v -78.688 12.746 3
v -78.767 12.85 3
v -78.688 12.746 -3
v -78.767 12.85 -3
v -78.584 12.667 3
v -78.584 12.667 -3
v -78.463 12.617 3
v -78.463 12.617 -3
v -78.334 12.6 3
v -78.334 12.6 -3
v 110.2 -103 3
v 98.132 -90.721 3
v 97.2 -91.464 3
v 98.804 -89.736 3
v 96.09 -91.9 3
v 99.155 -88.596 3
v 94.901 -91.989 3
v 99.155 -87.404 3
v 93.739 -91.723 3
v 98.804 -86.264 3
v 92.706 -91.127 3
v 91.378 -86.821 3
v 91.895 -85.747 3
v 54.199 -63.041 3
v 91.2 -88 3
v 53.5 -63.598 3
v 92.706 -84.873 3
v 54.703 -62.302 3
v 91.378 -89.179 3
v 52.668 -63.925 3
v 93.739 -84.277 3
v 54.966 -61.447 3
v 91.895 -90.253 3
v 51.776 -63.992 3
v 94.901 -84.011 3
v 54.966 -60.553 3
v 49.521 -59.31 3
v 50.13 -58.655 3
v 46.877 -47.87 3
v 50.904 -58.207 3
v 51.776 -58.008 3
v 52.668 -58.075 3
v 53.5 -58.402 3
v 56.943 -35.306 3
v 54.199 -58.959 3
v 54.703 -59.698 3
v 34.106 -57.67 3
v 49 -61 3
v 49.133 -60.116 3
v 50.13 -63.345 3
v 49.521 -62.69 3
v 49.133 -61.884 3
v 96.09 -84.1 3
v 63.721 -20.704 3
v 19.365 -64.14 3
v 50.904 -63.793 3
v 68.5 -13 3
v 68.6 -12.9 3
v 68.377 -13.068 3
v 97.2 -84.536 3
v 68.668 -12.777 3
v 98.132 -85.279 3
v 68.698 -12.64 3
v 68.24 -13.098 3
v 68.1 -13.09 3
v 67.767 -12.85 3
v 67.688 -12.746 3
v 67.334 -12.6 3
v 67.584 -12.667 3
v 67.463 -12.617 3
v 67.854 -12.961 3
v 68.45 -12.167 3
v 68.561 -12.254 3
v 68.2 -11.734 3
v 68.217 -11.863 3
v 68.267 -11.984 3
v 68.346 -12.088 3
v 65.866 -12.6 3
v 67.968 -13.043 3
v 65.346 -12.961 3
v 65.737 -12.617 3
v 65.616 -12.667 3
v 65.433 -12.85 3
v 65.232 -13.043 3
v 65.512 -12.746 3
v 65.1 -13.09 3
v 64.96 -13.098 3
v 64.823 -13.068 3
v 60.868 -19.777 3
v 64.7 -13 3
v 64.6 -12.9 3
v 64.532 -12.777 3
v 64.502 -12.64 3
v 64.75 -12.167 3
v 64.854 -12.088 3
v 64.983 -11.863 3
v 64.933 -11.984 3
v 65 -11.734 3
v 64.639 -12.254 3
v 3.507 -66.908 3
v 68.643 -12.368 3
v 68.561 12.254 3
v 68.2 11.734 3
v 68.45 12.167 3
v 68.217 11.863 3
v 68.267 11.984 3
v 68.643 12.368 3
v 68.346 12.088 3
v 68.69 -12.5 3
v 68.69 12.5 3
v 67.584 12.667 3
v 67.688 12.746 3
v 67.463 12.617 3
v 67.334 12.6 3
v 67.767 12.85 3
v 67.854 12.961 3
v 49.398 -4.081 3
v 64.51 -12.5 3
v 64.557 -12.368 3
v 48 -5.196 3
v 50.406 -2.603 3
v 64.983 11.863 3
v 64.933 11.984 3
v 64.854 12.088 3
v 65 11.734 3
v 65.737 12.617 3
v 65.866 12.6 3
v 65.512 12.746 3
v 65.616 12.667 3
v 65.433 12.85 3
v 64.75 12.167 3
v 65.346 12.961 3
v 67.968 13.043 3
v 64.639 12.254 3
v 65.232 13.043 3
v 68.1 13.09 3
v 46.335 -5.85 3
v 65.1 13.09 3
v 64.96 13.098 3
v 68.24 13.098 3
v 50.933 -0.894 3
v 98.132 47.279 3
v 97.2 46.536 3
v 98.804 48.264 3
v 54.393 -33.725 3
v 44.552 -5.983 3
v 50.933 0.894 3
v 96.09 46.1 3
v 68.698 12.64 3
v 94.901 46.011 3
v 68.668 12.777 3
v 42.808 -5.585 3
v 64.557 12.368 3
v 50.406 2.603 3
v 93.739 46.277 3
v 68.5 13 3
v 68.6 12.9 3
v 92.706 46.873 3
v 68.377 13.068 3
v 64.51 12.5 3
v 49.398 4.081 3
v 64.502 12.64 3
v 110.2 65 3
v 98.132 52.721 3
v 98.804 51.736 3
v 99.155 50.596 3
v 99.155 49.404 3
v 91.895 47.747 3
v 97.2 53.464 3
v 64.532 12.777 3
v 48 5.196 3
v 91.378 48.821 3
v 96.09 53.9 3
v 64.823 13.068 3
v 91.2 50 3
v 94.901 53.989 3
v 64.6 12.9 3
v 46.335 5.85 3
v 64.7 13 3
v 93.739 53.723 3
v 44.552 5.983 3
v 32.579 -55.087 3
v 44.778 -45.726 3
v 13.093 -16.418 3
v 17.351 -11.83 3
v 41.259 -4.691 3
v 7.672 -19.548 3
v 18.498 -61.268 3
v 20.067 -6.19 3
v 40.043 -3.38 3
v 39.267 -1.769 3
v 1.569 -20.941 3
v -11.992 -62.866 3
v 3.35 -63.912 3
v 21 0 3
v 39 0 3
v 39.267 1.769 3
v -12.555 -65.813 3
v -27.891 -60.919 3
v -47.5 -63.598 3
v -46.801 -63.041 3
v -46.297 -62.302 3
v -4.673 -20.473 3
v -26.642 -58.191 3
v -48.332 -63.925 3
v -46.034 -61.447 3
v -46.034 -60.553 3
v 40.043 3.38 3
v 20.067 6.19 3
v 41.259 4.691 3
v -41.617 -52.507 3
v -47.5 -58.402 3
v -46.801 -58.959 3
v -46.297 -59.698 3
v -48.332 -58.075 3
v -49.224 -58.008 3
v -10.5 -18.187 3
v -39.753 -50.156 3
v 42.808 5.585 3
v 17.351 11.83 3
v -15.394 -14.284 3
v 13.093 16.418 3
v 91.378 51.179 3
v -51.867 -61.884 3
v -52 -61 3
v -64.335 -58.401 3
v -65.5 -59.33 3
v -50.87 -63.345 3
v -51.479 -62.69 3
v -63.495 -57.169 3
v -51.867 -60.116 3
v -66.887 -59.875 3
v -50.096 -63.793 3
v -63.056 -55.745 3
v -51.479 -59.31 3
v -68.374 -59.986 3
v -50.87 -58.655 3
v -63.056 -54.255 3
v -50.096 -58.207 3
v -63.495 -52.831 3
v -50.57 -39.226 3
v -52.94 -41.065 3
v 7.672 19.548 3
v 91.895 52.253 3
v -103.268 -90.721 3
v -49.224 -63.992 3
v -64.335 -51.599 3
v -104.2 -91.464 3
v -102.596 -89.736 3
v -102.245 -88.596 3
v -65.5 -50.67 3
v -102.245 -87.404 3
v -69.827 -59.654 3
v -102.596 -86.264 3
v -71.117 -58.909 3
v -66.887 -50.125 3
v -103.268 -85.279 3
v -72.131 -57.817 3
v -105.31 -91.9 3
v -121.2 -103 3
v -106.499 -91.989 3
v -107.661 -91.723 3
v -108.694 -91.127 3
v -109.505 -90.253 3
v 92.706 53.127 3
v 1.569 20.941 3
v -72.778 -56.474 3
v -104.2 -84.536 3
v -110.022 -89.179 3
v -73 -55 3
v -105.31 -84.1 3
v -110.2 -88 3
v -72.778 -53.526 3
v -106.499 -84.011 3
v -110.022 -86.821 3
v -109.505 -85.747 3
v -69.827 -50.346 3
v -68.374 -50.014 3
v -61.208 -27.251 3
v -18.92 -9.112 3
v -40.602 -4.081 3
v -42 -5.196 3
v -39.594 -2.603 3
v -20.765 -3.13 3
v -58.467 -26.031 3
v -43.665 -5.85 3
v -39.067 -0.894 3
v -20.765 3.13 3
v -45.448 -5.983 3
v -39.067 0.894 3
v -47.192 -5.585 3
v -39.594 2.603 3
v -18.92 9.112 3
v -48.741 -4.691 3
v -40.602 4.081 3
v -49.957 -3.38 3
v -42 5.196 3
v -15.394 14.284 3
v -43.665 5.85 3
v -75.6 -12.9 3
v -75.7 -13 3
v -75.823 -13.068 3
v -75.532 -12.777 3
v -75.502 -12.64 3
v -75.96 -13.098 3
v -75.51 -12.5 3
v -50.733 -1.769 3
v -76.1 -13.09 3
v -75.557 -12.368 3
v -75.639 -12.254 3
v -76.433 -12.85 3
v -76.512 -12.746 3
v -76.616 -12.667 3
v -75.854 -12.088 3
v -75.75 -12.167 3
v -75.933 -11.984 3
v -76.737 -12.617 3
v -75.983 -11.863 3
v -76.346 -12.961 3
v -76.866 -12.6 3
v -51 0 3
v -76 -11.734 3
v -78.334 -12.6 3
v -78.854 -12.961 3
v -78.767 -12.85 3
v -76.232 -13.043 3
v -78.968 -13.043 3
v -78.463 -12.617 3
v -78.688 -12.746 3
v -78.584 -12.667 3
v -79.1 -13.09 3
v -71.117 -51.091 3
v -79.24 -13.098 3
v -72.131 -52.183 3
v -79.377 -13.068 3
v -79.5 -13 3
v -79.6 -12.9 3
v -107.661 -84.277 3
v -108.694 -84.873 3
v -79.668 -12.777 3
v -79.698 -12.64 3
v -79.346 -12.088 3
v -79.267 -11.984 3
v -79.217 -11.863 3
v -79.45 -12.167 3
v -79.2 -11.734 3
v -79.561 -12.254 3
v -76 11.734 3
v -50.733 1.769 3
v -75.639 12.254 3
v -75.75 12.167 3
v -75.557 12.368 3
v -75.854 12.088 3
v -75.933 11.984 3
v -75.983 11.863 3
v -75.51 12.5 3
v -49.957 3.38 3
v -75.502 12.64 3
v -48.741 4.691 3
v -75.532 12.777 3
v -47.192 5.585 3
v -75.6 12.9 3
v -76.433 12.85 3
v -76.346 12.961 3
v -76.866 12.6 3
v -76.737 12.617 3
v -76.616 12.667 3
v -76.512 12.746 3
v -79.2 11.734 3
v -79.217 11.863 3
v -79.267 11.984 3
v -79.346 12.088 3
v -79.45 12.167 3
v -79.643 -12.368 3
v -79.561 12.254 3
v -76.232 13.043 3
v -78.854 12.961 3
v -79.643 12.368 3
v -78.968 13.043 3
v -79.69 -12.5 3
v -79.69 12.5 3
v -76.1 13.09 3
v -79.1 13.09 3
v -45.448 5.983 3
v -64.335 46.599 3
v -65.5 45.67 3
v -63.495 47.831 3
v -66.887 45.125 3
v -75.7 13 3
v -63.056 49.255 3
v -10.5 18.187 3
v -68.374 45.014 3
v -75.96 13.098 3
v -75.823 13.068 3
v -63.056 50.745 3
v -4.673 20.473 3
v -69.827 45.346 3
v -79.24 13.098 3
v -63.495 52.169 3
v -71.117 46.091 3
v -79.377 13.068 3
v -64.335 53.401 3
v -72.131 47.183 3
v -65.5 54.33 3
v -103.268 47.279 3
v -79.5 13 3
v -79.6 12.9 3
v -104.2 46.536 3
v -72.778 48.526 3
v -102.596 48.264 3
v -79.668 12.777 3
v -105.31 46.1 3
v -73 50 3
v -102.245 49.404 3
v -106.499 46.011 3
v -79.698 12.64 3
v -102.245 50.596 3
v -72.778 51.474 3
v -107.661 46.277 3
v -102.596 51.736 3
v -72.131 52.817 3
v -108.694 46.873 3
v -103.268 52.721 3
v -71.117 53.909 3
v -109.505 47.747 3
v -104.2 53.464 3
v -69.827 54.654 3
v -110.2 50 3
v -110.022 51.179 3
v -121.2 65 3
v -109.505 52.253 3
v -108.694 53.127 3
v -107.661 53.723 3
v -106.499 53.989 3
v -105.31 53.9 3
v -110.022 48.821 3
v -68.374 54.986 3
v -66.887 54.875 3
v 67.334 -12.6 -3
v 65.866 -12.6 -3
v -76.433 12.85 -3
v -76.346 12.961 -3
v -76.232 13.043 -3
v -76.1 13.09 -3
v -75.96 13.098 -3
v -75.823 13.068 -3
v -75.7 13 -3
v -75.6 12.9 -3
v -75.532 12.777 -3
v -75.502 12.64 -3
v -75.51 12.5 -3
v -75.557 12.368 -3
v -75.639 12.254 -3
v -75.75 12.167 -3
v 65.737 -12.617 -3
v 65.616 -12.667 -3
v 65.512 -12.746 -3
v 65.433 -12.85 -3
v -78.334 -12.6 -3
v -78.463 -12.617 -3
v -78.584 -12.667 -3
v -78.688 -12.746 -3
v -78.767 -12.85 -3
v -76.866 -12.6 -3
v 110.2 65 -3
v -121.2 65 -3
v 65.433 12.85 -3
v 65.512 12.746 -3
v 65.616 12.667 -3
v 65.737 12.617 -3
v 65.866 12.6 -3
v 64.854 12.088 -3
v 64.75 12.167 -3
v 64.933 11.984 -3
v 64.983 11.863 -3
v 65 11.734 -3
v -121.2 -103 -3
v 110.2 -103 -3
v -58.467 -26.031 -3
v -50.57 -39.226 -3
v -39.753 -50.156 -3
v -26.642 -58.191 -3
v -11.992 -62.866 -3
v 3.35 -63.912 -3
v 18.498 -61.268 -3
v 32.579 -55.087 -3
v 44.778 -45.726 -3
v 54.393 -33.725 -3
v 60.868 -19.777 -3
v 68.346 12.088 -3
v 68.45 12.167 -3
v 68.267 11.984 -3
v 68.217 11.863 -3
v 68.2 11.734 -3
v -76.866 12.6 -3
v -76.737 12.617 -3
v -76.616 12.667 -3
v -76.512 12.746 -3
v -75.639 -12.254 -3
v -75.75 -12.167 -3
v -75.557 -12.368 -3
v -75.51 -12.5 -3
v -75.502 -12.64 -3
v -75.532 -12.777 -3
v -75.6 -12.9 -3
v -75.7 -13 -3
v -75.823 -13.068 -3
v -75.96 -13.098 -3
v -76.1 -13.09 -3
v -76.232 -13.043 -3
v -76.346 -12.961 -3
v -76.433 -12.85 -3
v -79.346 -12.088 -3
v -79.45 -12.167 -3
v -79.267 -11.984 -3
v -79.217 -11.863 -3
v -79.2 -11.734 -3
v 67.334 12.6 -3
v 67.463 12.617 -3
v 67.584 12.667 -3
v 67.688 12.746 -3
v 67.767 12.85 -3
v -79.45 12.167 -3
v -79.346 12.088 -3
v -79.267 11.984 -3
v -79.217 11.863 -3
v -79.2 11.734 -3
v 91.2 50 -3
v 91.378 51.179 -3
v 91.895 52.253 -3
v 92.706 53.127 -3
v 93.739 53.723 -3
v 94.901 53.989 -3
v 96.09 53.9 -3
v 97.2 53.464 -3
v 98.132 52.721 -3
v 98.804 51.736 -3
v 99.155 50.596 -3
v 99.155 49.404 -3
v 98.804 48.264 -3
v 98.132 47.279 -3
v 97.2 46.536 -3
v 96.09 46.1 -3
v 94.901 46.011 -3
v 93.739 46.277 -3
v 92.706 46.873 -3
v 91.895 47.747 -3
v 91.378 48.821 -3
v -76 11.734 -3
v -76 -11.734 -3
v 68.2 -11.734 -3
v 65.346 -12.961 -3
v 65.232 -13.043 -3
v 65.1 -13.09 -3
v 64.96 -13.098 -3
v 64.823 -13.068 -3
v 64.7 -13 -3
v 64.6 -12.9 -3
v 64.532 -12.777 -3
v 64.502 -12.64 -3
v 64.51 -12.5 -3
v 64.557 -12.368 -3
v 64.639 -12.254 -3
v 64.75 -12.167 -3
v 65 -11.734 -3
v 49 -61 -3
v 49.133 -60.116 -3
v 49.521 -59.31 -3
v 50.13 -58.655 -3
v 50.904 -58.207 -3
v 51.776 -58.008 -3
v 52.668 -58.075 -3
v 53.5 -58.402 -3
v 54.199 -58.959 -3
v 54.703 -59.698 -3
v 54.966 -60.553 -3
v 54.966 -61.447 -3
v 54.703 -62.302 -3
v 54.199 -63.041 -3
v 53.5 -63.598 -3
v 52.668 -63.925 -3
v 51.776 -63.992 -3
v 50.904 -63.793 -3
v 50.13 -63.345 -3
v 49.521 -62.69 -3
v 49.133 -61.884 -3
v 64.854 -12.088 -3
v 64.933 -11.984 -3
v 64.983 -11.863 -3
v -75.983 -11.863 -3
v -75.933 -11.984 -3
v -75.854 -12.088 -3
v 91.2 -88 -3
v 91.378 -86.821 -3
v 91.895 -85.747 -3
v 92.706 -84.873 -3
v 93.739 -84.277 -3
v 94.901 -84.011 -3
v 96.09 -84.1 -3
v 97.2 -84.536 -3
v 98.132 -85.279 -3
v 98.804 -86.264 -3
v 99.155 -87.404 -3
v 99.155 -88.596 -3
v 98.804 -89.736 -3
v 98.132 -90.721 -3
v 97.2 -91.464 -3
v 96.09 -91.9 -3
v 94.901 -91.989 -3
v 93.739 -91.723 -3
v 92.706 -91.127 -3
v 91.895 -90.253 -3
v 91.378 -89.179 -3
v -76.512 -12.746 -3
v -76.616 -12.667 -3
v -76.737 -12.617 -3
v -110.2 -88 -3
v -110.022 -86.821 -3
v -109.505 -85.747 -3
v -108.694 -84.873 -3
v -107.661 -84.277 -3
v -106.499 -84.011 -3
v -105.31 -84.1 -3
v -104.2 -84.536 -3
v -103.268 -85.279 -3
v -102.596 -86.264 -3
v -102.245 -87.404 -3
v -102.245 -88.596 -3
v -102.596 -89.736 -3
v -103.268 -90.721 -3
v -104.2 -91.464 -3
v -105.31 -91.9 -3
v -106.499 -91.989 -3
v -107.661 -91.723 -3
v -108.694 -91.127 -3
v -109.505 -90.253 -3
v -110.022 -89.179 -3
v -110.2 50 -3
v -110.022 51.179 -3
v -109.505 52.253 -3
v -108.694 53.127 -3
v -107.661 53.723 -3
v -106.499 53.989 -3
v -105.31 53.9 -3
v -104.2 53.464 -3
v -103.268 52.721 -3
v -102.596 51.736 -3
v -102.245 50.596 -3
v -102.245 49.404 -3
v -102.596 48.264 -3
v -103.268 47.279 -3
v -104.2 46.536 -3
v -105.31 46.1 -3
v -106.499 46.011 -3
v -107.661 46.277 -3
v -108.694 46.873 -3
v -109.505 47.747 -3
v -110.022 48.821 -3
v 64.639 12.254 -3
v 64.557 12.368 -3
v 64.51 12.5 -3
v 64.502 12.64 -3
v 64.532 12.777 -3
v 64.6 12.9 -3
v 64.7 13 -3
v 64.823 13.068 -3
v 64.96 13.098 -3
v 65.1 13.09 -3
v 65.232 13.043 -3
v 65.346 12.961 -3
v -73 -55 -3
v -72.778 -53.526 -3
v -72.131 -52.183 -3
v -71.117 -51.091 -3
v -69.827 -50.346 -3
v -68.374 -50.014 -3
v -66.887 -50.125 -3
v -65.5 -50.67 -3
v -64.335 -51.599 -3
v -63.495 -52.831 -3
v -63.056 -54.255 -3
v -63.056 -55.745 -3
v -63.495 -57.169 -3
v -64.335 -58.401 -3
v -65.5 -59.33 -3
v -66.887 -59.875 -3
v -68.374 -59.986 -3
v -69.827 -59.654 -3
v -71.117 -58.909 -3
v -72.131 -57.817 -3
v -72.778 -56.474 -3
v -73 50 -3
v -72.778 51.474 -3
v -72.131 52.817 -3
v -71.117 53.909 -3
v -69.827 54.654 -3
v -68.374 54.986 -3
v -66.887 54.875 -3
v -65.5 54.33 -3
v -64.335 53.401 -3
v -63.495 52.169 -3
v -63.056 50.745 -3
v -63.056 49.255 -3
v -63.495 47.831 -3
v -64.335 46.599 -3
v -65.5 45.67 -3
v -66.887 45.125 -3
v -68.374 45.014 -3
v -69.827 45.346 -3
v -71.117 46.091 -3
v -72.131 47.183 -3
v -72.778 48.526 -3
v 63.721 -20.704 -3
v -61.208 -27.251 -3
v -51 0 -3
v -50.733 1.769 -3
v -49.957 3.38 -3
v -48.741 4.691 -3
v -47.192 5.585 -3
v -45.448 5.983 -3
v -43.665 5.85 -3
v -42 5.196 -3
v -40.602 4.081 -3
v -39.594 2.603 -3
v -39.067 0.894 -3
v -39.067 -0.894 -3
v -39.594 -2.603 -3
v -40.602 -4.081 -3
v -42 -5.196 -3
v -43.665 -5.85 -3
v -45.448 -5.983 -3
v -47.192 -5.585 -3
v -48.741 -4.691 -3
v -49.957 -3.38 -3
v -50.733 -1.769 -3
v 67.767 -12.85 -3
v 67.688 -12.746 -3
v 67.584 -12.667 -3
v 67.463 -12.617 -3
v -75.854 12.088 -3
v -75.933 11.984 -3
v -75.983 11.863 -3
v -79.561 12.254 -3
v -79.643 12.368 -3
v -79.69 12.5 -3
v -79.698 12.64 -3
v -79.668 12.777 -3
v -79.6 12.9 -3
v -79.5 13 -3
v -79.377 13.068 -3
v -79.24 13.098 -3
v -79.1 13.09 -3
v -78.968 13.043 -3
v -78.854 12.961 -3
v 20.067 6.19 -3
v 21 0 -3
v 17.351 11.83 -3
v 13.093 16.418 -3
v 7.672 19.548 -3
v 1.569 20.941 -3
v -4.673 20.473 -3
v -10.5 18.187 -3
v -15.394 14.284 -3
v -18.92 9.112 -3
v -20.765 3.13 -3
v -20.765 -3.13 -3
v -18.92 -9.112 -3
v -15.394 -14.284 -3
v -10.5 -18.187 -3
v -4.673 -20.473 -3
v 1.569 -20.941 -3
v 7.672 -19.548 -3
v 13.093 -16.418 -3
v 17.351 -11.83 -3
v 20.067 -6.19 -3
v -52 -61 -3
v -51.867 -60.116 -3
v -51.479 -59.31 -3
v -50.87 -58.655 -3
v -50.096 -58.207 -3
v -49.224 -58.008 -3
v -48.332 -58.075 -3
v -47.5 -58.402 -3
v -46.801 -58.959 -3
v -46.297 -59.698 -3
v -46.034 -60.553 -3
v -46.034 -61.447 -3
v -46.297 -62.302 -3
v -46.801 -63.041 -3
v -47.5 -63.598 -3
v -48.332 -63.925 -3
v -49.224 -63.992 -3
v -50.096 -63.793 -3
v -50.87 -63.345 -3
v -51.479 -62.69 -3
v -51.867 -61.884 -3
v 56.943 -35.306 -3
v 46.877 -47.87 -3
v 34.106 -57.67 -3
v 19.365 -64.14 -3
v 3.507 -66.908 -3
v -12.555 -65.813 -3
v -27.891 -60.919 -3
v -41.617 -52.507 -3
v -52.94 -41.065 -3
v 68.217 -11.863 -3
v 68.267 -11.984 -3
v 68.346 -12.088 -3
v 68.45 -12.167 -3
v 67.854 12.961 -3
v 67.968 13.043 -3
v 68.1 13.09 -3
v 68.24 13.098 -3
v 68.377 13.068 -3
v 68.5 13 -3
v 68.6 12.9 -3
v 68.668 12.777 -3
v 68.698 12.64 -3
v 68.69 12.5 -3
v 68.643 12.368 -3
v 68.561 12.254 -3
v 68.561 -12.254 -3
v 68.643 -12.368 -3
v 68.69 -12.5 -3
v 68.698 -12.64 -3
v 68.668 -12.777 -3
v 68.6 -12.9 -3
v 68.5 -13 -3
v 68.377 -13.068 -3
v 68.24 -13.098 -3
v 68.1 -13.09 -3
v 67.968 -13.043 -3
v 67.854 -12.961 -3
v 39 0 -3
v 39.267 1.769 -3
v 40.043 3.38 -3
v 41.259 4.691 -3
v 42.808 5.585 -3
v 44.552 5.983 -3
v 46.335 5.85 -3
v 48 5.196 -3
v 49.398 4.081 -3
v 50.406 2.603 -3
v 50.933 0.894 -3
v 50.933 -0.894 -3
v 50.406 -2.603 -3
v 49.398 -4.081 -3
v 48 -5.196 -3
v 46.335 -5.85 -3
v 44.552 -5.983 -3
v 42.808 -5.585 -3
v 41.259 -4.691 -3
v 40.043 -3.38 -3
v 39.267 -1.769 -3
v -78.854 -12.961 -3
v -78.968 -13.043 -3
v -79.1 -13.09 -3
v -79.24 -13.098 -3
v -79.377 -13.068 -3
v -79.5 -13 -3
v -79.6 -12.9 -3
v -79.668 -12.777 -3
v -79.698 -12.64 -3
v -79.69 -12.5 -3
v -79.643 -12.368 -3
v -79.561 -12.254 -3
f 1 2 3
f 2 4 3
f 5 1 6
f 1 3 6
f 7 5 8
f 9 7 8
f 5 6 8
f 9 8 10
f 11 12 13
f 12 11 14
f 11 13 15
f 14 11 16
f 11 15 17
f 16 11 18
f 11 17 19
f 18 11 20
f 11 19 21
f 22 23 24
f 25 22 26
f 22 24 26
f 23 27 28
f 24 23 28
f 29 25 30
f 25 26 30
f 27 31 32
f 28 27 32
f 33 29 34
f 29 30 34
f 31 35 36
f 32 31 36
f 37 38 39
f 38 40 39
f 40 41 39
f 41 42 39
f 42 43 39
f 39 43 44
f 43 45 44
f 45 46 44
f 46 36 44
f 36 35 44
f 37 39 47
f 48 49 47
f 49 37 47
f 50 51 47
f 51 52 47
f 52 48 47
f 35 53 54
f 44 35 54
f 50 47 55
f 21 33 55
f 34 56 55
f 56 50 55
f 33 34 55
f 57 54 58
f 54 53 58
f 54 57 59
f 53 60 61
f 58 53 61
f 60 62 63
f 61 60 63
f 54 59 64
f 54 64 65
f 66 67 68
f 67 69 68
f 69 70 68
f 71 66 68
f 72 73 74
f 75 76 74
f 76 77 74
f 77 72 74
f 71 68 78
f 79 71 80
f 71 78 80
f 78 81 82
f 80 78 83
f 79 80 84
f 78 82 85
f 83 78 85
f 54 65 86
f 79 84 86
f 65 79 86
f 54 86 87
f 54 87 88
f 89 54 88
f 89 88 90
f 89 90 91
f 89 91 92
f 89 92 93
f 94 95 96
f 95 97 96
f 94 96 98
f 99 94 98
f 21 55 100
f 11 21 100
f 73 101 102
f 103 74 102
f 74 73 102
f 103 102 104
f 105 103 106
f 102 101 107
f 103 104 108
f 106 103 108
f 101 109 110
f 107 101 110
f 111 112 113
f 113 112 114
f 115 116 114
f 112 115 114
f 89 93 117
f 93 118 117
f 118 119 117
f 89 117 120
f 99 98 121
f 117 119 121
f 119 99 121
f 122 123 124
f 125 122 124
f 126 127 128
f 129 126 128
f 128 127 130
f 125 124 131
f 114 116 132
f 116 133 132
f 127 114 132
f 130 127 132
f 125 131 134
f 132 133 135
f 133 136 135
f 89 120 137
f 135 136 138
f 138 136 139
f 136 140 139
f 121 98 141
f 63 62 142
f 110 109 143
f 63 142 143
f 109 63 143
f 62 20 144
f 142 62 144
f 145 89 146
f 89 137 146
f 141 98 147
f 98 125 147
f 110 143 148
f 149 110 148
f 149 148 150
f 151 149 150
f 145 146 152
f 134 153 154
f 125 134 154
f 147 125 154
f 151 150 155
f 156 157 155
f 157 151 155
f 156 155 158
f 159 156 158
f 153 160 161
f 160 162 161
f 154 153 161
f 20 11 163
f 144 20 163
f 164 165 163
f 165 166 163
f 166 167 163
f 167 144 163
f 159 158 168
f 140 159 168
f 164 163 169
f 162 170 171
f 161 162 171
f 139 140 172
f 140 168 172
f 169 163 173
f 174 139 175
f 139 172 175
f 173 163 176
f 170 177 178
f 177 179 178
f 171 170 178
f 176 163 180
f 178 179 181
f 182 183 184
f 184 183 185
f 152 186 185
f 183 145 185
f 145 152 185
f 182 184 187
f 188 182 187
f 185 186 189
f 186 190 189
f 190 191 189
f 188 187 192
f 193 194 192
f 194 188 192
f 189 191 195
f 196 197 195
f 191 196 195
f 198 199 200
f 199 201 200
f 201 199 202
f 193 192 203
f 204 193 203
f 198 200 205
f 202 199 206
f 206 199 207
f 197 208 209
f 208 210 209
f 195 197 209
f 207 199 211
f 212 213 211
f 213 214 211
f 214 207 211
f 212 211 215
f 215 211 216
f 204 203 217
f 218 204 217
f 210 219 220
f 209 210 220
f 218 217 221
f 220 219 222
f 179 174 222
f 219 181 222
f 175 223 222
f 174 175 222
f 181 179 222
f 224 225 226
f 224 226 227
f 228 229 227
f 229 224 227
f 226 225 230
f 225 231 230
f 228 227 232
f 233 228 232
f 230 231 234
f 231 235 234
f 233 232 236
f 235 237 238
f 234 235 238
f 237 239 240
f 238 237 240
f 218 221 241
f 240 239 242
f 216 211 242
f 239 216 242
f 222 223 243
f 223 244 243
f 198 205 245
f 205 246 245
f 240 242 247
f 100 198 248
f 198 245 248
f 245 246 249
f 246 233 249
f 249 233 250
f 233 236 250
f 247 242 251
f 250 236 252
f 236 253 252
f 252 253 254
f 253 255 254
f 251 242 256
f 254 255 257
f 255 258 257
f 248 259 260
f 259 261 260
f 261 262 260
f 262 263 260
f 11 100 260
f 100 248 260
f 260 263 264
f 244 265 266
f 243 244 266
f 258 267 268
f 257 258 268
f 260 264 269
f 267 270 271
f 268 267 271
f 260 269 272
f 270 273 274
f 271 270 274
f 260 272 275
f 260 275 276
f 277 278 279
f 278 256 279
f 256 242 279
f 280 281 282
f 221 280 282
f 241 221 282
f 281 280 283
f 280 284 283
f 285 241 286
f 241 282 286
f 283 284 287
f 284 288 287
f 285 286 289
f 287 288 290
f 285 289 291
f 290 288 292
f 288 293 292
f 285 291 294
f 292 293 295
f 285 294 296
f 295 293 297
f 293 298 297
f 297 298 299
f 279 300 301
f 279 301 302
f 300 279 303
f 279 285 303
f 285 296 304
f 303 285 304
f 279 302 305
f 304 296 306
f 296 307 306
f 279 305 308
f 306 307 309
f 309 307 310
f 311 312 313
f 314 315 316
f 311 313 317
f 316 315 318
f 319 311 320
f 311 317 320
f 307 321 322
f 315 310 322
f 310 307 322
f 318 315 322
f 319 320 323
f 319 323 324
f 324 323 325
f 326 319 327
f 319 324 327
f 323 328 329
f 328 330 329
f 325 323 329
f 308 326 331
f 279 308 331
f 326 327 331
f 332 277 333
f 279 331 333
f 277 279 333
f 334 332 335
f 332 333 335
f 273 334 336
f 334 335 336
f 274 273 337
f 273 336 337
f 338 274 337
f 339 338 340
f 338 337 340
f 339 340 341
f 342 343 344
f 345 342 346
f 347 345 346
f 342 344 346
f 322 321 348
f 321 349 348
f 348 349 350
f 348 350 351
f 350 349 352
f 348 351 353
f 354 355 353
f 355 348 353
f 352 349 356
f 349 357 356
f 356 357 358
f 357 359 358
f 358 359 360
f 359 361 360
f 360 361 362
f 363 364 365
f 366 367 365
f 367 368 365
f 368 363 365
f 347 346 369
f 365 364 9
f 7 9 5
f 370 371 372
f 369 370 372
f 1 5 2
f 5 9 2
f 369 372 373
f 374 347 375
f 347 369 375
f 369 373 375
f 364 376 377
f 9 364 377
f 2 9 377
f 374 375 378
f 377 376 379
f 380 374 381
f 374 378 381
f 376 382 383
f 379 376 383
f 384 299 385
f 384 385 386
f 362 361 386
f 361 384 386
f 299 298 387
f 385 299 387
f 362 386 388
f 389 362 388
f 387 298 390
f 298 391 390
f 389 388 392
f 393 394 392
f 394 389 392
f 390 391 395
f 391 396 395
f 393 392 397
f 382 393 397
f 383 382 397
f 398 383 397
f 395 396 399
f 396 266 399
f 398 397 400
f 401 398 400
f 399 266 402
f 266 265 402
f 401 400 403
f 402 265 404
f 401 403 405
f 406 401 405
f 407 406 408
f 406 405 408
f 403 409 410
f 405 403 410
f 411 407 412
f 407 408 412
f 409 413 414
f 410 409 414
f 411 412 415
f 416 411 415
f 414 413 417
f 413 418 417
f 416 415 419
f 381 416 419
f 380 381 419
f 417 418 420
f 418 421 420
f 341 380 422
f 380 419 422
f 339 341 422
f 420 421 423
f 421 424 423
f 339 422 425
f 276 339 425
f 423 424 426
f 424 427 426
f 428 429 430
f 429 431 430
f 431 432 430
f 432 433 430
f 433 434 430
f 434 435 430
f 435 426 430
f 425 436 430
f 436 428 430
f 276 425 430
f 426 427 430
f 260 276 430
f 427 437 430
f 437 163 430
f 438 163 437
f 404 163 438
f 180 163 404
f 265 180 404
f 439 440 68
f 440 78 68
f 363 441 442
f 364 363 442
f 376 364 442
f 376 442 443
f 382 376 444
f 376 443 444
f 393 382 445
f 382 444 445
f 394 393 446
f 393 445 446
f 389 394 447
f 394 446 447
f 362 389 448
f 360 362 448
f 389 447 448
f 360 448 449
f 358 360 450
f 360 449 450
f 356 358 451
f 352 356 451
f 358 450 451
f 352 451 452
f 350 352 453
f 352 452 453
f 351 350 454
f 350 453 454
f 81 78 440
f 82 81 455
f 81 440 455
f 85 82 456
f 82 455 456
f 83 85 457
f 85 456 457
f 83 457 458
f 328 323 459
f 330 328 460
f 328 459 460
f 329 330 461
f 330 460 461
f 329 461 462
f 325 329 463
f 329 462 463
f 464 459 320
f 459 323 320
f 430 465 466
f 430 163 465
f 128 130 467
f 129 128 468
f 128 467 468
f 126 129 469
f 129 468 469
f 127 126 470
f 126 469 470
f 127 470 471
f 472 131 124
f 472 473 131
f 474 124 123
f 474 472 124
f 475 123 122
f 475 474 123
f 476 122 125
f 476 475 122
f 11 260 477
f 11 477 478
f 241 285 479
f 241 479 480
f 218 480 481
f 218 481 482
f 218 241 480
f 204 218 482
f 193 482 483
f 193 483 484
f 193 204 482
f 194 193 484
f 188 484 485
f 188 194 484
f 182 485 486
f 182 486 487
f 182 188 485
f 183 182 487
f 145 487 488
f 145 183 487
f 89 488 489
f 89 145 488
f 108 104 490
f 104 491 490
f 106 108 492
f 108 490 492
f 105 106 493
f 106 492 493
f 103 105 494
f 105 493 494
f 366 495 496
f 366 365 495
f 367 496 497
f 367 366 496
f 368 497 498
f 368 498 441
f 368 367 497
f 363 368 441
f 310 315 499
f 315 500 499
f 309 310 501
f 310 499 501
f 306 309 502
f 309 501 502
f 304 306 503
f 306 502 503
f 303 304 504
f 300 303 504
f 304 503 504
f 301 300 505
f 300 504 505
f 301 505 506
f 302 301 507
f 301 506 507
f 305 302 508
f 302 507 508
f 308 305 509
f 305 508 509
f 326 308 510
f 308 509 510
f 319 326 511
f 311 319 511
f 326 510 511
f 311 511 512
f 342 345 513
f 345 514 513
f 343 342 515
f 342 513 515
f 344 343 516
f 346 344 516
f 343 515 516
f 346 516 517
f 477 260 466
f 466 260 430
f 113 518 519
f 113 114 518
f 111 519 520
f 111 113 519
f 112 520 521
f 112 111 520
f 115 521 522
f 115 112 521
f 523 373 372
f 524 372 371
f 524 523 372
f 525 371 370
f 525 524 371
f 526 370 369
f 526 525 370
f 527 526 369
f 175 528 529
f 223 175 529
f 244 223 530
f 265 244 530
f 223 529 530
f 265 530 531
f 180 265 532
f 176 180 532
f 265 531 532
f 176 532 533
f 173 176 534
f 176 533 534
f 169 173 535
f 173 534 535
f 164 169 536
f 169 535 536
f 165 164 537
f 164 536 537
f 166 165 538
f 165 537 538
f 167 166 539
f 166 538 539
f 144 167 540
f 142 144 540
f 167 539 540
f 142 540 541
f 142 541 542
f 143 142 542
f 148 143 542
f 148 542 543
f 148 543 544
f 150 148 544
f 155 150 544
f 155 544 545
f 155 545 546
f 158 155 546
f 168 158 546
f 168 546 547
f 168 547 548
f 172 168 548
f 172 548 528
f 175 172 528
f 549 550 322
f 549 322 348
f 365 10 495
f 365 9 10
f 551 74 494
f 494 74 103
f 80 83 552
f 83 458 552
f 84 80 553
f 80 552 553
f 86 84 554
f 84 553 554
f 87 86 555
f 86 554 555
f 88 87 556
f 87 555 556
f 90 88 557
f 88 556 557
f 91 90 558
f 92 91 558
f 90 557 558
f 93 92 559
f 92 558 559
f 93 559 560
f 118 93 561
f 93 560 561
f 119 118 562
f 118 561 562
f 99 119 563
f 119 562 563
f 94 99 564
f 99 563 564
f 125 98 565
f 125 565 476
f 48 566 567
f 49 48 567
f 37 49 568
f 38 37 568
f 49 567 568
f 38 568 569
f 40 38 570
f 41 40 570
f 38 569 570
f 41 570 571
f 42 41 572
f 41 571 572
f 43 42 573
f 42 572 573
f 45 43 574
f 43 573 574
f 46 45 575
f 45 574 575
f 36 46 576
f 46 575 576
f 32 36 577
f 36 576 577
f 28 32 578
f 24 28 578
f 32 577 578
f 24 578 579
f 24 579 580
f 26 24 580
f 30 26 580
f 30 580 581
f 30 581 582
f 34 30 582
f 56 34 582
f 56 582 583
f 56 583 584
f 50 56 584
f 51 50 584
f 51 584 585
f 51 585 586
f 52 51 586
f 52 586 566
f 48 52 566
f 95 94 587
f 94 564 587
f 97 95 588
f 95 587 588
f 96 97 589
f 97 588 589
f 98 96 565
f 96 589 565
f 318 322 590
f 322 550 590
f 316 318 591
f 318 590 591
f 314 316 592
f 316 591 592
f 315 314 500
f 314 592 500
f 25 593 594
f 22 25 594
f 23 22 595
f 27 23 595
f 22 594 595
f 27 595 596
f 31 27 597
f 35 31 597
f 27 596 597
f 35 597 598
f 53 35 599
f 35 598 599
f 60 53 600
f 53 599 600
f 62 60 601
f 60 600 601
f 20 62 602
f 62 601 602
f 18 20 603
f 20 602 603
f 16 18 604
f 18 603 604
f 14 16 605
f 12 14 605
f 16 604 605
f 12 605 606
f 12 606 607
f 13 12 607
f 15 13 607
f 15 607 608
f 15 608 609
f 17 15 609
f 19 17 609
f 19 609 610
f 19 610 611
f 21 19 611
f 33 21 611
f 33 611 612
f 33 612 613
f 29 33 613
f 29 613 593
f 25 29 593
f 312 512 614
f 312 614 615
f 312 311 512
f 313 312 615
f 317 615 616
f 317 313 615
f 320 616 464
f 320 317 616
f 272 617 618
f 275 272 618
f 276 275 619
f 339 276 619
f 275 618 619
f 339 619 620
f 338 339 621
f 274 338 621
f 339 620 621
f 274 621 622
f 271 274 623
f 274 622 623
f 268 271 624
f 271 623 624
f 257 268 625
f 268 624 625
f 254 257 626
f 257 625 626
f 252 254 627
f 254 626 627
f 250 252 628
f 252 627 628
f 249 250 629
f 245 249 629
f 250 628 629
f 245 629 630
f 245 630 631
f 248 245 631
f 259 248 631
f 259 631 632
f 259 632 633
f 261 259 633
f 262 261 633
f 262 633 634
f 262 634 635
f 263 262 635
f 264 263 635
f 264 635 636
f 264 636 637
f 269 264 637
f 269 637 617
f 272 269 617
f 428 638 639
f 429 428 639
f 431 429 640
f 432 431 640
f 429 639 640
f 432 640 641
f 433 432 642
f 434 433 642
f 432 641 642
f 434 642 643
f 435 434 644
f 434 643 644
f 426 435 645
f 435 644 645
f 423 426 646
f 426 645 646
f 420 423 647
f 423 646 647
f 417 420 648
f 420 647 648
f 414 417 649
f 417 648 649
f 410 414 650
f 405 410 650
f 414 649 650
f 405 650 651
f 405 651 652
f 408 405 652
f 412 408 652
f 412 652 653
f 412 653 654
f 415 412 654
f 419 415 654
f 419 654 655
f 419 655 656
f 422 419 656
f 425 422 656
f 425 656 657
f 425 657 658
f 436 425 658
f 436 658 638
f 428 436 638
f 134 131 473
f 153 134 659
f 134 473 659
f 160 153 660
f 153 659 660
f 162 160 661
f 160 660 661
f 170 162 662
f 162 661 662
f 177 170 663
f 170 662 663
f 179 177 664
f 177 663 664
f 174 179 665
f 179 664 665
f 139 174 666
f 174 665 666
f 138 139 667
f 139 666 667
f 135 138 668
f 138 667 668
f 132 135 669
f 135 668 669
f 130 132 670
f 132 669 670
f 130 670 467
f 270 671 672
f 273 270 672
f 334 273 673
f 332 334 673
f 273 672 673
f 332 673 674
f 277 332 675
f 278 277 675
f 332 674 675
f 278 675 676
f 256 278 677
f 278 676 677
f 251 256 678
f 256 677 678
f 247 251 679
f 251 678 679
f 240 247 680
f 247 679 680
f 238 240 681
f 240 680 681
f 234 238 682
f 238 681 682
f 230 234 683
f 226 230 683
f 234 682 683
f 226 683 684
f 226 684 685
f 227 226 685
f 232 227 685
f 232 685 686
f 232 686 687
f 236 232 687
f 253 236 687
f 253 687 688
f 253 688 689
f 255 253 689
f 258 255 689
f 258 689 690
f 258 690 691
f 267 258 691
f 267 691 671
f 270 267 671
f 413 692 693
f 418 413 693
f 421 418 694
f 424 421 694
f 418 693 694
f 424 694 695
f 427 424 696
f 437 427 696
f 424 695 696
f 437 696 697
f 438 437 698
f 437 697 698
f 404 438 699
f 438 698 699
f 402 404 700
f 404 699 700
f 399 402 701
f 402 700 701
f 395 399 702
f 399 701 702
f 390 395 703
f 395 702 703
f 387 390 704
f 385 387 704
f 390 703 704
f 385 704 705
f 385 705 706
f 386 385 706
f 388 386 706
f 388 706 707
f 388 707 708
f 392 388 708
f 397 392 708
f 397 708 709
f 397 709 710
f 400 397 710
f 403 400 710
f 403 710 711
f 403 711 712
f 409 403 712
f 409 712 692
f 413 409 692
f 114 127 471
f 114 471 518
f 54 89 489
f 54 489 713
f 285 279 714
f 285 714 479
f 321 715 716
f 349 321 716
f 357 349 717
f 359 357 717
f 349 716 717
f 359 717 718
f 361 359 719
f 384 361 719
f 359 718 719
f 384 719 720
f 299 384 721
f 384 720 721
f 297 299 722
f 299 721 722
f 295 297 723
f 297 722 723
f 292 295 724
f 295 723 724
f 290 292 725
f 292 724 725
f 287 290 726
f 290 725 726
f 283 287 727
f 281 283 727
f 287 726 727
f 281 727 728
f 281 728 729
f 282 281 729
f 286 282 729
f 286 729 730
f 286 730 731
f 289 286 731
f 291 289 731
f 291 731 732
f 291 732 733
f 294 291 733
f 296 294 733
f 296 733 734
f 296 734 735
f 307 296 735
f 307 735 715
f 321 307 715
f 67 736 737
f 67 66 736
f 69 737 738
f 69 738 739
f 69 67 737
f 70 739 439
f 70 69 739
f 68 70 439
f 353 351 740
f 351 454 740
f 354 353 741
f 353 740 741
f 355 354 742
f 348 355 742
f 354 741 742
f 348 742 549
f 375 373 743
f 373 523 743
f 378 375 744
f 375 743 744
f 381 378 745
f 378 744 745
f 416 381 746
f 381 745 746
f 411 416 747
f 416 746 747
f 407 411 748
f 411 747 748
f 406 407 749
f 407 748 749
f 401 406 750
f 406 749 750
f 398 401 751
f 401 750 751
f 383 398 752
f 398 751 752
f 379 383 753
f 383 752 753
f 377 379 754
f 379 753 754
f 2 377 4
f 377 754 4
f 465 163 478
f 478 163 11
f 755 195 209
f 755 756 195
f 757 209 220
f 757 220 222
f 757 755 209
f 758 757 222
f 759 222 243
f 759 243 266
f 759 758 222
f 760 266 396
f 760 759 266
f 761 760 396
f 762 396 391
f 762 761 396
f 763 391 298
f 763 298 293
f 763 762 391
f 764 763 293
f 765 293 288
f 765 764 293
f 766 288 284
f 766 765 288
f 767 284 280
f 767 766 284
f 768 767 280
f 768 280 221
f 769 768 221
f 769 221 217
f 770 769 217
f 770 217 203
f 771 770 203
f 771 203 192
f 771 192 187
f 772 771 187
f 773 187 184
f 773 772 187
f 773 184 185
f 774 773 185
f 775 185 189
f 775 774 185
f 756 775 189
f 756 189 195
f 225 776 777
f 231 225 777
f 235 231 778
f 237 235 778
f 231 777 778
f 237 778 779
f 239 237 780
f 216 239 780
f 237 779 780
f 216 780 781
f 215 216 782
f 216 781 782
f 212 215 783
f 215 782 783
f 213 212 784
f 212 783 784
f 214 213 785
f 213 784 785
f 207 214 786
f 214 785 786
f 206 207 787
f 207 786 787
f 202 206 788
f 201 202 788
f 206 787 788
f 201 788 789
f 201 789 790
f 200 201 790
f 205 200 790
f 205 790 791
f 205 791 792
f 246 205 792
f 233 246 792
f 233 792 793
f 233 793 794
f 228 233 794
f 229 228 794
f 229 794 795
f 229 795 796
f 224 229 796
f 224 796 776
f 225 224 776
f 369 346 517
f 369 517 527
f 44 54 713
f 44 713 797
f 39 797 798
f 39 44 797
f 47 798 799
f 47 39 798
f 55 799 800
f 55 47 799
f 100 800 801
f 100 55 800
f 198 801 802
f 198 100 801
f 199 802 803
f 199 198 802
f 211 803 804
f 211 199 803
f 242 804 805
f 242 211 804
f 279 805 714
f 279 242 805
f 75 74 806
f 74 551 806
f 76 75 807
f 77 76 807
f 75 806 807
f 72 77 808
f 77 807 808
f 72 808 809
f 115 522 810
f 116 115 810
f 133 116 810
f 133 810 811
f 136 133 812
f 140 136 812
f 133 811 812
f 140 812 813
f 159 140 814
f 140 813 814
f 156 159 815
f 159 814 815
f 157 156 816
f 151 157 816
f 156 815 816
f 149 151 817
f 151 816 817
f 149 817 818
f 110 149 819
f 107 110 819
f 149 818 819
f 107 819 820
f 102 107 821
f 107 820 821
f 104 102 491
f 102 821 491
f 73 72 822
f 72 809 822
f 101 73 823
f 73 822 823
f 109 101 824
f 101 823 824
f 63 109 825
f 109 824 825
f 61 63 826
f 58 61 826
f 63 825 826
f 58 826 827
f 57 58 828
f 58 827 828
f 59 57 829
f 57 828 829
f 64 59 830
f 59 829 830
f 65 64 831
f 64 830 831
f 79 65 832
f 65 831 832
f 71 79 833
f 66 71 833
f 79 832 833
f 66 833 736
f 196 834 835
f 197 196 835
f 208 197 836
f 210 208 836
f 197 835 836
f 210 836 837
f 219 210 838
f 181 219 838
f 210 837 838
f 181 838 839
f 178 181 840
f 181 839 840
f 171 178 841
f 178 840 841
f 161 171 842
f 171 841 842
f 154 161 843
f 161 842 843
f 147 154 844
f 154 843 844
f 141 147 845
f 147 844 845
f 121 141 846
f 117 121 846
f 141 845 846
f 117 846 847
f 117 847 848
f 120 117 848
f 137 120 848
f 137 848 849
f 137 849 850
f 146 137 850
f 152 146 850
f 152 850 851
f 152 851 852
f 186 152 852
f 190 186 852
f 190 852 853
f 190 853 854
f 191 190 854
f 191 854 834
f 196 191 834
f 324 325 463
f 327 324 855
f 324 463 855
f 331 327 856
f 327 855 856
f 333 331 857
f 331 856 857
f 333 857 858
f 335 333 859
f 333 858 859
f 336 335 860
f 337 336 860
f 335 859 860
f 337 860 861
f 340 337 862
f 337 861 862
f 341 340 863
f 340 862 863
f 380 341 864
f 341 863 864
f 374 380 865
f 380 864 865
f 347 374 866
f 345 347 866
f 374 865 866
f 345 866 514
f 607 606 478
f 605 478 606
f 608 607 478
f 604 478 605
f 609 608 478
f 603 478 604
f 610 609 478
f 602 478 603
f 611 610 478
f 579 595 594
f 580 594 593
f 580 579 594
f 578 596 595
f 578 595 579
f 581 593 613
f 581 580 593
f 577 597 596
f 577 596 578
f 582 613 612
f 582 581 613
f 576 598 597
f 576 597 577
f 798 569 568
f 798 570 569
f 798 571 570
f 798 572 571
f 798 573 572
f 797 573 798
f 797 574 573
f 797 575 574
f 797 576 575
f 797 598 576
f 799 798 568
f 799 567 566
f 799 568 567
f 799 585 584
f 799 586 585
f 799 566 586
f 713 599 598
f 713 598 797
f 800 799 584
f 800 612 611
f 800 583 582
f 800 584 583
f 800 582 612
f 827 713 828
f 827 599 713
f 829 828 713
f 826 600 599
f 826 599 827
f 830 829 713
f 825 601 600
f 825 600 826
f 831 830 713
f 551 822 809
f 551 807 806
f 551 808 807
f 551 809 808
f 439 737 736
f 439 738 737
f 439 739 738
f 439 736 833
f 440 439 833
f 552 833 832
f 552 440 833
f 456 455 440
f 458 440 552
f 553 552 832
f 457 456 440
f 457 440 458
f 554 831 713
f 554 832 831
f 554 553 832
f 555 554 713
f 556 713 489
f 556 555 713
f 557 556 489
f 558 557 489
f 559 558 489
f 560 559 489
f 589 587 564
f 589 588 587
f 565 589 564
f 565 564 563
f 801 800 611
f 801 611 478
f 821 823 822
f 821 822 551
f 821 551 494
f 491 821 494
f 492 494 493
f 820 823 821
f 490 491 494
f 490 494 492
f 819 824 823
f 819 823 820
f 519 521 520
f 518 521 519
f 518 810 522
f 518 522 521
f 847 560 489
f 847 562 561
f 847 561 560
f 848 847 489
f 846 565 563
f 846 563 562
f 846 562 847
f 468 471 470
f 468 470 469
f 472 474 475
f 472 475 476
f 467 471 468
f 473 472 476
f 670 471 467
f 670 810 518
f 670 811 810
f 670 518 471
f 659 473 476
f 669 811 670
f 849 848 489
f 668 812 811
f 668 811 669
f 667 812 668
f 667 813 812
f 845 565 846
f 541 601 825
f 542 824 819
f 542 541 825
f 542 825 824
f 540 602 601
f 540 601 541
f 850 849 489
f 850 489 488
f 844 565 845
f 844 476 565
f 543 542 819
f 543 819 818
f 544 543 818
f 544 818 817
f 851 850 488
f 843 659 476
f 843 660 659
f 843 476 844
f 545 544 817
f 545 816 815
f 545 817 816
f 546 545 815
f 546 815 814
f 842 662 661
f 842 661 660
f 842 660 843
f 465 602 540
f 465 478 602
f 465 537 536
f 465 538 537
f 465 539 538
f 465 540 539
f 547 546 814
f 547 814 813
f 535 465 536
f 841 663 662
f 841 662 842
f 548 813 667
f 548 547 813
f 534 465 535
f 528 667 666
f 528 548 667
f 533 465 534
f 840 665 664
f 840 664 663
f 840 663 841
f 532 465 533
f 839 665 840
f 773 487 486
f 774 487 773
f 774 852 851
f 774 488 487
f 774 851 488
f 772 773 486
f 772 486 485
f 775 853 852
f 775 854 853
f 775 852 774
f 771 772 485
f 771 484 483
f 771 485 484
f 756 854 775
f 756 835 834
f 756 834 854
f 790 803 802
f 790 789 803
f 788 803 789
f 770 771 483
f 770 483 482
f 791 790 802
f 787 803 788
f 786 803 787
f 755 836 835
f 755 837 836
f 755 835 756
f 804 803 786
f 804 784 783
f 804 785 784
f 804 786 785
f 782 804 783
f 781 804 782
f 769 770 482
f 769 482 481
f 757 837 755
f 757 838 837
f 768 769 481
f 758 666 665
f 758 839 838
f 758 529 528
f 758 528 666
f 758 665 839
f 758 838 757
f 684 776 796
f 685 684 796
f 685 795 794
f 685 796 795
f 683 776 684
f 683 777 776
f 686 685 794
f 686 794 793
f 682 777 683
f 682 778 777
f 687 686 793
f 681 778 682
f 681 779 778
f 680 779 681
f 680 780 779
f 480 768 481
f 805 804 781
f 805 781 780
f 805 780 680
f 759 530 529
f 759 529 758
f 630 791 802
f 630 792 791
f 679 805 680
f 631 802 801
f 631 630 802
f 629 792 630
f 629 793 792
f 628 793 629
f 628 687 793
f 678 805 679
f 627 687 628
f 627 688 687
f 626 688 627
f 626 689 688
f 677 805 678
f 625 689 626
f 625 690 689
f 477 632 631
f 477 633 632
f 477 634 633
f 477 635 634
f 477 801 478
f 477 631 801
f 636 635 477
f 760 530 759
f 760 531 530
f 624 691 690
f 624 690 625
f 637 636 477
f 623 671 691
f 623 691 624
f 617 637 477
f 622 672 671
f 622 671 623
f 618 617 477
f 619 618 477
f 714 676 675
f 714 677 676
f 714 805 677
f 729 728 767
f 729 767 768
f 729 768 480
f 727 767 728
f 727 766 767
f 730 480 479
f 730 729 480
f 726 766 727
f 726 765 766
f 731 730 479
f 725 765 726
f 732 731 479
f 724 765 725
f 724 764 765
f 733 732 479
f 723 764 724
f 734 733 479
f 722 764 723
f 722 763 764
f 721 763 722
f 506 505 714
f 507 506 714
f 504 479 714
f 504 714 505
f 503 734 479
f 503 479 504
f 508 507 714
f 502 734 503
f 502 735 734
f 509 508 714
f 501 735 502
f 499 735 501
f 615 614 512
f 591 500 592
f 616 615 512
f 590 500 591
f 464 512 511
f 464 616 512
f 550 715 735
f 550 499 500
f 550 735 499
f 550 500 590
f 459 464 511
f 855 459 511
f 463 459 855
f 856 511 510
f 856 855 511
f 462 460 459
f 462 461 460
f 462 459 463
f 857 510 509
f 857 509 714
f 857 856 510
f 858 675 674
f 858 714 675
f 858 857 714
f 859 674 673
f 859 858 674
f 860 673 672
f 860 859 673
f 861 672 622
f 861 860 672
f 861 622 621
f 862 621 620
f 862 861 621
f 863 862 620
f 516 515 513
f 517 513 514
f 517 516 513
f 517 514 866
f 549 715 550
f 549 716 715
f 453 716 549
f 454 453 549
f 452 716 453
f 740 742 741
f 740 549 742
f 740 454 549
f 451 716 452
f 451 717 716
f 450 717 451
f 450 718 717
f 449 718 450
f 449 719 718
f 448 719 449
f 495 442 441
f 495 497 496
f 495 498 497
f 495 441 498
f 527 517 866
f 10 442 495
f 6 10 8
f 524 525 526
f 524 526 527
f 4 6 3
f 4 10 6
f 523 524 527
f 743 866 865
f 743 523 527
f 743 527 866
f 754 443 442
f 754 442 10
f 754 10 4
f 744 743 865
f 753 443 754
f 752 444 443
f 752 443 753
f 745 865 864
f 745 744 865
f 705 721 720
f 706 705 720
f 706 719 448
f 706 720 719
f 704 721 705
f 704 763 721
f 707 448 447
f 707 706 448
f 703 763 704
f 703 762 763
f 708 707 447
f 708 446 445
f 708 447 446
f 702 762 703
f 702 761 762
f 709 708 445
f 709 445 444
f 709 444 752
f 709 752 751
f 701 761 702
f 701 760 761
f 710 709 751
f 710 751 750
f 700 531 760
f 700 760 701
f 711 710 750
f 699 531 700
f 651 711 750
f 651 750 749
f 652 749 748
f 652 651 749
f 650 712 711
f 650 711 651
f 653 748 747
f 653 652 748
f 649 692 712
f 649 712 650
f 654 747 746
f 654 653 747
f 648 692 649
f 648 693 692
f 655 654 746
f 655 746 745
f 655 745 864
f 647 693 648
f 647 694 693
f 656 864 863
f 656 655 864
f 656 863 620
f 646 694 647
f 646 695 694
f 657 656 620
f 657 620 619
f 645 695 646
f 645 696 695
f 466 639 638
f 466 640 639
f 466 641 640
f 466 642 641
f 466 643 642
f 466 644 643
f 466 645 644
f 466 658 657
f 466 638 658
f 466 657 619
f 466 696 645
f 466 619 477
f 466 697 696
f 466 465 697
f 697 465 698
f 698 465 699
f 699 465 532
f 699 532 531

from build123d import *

# Parameters (mm, degrees)
SKETCH2_R                  = 21
SKETCH2_W                  = 3.2
SKETCH2_H                  = 25.2
BOSS_EXTRUDE1_DEPTH        = 3
F_10_0_10_DIAMETER_HOLE1_D = 10
F_8_0_8_DIAMETER_HOLE1_D   = 8
F_12_0_12_DIAMETER_HOLE1_D = 12
CUT_EXTRUDE1_DEPTH         = 160.1679616
CUT_EXTRUDE1_DEPTH_BACK    = 160.1679616
SKETCH19_R                 = 0.5
CUT_EXTRUDE2_DEPTH         = 160.1679616
FILLET1_R                  = 0.5
F_6_0_6_DIAMETER_HOLE1_D   = 6


with BuildPart() as part:
    # Sketch2 → Boss-Extrude1 (new, symmetric)
    with BuildSketch(Plane.XY):
        Polygon((-68, 65), (95.2, 65), (110.2, 65), (110.2, -103), (0, -103), (-121.2, -103), (-121.2, 65), (-106.2, 65), align=None)
        Circle(SKETCH2_R, mode=Mode.SUBTRACT)
        with Locations((-77.6, 0)):
            Rectangle(SKETCH2_W, SKETCH2_H, mode=Mode.SUBTRACT)
        with Locations((66.6, 0)):
            Rectangle(SKETCH2_W, SKETCH2_H, mode=Mode.SUBTRACT)
    extrude(amount=BOSS_EXTRUDE1_DEPTH, both=True)

    # Ø10.0 (10) Diameter Hole1 (through all)
    with Locations(Plane.XY.offset(3)):
        with Locations((-68, 50), (-68, -55)):
            Hole(F_10_0_10_DIAMETER_HOLE1_D / 2)

    # Ø8.0 (8) Diameter Hole1 (through all)
    with Locations(Plane.XY.offset(3)):
        with Locations((-106.2, 50), (-106.2, -88), (95.2, -88), (95.2, 50)):
            Hole(F_8_0_8_DIAMETER_HOLE1_D / 2)

    # Ø12.0 (12) Diameter Hole1 (through all)
    with Locations(Plane.XY.offset(3)):
        with Locations((-45, 0), (45, 0)):
            Hole(F_12_0_12_DIAMETER_HOLE1_D / 2)

    # Sketch18 → Cut-Extrude1 (cut, two sides: drawn at the far end of the back side and taken through both)
    with BuildSketch(Plane(origin=(0, 0, -3), x_dir=(-1, 0, 0), z_dir=(0, 0, -1)).offset(-CUT_EXTRUDE1_DEPTH_BACK)):
        with BuildLine():
            Line((-60.867617043, -19.77708764), (-63.720786592, -20.704138623))
            ThreePointArc((-63.720786592, -20.704138623), (-3.506509068, -66.908178829), (61.207545662, -27.251355086))
            Line((61.207545662, -27.251355086), (58.466909289, -26.031145157))
            ThreePointArc((58.466909289, -26.031145157), (-3.3495012, -63.912290224), (-60.867617043, -19.77708764))
        make_face()
    extrude(amount=CUT_EXTRUDE1_DEPTH + CUT_EXTRUDE1_DEPTH_BACK, mode=Mode.SUBTRACT)

    # Sketch19 → Cut-Extrude2 (cut, through all)
    with BuildSketch(Plane(origin=(0, 0, -3), x_dir=(-1, 0, 0), z_dir=(0, 0, -1))):
        with Locations((-65, -12.6)):
            Circle(SKETCH19_R)
        with Locations((-68.2, -12.6)):
            Circle(SKETCH19_R)
        with Locations((-68.2, 12.6)):
            Circle(SKETCH19_R)
        with Locations((-65, 12.6)):
            Circle(SKETCH19_R)
        with Locations((79.2, -12.6)):
            Circle(SKETCH19_R)
        with Locations((76, -12.6)):
            Circle(SKETCH19_R)
        with Locations((79.2, 12.6)):
            Circle(SKETCH19_R)
        with Locations((76, 12.6)):
            Circle(SKETCH19_R)
    extrude(amount=-CUT_EXTRUDE2_DEPTH, mode=Mode.SUBTRACT)

    # Fillet1
    fillet1_edges = [part.edges().sort_by_distance(p)[0] for p in [
        (68.2, 12.1, 0),
        (68.2, -12.1, 0),
        (65.5, -12.6, 0),
        (65, 12.1, 0),
        (-76, -12.1, 0),
        (-76, 12.1, 0),
        (-78.7, -12.6, 0),
        (-79.2, 12.1, 0),
        (67.7, -12.6, 0),
        (67.7, 12.6, 0),
        (65.5, 12.6, 0),
        (-79.2, -12.1, 0),
        (-76.5, 12.6, 0),
        (-78.7, 12.6, 0),
        (-76.5, -12.6, 0),
        (65, -12.1, 0),
    ]]
    fillet(fillet1_edges, radius=FILLET1_R)

    # Ø6.0 (6) Diameter Hole1 (through all)
    with Locations(Plane.XY.offset(3)):
        with Locations((-49, -61), (52, -61)):
            Hole(F_6_0_6_DIAMETER_HOLE1_D / 2)


solid = part.part
